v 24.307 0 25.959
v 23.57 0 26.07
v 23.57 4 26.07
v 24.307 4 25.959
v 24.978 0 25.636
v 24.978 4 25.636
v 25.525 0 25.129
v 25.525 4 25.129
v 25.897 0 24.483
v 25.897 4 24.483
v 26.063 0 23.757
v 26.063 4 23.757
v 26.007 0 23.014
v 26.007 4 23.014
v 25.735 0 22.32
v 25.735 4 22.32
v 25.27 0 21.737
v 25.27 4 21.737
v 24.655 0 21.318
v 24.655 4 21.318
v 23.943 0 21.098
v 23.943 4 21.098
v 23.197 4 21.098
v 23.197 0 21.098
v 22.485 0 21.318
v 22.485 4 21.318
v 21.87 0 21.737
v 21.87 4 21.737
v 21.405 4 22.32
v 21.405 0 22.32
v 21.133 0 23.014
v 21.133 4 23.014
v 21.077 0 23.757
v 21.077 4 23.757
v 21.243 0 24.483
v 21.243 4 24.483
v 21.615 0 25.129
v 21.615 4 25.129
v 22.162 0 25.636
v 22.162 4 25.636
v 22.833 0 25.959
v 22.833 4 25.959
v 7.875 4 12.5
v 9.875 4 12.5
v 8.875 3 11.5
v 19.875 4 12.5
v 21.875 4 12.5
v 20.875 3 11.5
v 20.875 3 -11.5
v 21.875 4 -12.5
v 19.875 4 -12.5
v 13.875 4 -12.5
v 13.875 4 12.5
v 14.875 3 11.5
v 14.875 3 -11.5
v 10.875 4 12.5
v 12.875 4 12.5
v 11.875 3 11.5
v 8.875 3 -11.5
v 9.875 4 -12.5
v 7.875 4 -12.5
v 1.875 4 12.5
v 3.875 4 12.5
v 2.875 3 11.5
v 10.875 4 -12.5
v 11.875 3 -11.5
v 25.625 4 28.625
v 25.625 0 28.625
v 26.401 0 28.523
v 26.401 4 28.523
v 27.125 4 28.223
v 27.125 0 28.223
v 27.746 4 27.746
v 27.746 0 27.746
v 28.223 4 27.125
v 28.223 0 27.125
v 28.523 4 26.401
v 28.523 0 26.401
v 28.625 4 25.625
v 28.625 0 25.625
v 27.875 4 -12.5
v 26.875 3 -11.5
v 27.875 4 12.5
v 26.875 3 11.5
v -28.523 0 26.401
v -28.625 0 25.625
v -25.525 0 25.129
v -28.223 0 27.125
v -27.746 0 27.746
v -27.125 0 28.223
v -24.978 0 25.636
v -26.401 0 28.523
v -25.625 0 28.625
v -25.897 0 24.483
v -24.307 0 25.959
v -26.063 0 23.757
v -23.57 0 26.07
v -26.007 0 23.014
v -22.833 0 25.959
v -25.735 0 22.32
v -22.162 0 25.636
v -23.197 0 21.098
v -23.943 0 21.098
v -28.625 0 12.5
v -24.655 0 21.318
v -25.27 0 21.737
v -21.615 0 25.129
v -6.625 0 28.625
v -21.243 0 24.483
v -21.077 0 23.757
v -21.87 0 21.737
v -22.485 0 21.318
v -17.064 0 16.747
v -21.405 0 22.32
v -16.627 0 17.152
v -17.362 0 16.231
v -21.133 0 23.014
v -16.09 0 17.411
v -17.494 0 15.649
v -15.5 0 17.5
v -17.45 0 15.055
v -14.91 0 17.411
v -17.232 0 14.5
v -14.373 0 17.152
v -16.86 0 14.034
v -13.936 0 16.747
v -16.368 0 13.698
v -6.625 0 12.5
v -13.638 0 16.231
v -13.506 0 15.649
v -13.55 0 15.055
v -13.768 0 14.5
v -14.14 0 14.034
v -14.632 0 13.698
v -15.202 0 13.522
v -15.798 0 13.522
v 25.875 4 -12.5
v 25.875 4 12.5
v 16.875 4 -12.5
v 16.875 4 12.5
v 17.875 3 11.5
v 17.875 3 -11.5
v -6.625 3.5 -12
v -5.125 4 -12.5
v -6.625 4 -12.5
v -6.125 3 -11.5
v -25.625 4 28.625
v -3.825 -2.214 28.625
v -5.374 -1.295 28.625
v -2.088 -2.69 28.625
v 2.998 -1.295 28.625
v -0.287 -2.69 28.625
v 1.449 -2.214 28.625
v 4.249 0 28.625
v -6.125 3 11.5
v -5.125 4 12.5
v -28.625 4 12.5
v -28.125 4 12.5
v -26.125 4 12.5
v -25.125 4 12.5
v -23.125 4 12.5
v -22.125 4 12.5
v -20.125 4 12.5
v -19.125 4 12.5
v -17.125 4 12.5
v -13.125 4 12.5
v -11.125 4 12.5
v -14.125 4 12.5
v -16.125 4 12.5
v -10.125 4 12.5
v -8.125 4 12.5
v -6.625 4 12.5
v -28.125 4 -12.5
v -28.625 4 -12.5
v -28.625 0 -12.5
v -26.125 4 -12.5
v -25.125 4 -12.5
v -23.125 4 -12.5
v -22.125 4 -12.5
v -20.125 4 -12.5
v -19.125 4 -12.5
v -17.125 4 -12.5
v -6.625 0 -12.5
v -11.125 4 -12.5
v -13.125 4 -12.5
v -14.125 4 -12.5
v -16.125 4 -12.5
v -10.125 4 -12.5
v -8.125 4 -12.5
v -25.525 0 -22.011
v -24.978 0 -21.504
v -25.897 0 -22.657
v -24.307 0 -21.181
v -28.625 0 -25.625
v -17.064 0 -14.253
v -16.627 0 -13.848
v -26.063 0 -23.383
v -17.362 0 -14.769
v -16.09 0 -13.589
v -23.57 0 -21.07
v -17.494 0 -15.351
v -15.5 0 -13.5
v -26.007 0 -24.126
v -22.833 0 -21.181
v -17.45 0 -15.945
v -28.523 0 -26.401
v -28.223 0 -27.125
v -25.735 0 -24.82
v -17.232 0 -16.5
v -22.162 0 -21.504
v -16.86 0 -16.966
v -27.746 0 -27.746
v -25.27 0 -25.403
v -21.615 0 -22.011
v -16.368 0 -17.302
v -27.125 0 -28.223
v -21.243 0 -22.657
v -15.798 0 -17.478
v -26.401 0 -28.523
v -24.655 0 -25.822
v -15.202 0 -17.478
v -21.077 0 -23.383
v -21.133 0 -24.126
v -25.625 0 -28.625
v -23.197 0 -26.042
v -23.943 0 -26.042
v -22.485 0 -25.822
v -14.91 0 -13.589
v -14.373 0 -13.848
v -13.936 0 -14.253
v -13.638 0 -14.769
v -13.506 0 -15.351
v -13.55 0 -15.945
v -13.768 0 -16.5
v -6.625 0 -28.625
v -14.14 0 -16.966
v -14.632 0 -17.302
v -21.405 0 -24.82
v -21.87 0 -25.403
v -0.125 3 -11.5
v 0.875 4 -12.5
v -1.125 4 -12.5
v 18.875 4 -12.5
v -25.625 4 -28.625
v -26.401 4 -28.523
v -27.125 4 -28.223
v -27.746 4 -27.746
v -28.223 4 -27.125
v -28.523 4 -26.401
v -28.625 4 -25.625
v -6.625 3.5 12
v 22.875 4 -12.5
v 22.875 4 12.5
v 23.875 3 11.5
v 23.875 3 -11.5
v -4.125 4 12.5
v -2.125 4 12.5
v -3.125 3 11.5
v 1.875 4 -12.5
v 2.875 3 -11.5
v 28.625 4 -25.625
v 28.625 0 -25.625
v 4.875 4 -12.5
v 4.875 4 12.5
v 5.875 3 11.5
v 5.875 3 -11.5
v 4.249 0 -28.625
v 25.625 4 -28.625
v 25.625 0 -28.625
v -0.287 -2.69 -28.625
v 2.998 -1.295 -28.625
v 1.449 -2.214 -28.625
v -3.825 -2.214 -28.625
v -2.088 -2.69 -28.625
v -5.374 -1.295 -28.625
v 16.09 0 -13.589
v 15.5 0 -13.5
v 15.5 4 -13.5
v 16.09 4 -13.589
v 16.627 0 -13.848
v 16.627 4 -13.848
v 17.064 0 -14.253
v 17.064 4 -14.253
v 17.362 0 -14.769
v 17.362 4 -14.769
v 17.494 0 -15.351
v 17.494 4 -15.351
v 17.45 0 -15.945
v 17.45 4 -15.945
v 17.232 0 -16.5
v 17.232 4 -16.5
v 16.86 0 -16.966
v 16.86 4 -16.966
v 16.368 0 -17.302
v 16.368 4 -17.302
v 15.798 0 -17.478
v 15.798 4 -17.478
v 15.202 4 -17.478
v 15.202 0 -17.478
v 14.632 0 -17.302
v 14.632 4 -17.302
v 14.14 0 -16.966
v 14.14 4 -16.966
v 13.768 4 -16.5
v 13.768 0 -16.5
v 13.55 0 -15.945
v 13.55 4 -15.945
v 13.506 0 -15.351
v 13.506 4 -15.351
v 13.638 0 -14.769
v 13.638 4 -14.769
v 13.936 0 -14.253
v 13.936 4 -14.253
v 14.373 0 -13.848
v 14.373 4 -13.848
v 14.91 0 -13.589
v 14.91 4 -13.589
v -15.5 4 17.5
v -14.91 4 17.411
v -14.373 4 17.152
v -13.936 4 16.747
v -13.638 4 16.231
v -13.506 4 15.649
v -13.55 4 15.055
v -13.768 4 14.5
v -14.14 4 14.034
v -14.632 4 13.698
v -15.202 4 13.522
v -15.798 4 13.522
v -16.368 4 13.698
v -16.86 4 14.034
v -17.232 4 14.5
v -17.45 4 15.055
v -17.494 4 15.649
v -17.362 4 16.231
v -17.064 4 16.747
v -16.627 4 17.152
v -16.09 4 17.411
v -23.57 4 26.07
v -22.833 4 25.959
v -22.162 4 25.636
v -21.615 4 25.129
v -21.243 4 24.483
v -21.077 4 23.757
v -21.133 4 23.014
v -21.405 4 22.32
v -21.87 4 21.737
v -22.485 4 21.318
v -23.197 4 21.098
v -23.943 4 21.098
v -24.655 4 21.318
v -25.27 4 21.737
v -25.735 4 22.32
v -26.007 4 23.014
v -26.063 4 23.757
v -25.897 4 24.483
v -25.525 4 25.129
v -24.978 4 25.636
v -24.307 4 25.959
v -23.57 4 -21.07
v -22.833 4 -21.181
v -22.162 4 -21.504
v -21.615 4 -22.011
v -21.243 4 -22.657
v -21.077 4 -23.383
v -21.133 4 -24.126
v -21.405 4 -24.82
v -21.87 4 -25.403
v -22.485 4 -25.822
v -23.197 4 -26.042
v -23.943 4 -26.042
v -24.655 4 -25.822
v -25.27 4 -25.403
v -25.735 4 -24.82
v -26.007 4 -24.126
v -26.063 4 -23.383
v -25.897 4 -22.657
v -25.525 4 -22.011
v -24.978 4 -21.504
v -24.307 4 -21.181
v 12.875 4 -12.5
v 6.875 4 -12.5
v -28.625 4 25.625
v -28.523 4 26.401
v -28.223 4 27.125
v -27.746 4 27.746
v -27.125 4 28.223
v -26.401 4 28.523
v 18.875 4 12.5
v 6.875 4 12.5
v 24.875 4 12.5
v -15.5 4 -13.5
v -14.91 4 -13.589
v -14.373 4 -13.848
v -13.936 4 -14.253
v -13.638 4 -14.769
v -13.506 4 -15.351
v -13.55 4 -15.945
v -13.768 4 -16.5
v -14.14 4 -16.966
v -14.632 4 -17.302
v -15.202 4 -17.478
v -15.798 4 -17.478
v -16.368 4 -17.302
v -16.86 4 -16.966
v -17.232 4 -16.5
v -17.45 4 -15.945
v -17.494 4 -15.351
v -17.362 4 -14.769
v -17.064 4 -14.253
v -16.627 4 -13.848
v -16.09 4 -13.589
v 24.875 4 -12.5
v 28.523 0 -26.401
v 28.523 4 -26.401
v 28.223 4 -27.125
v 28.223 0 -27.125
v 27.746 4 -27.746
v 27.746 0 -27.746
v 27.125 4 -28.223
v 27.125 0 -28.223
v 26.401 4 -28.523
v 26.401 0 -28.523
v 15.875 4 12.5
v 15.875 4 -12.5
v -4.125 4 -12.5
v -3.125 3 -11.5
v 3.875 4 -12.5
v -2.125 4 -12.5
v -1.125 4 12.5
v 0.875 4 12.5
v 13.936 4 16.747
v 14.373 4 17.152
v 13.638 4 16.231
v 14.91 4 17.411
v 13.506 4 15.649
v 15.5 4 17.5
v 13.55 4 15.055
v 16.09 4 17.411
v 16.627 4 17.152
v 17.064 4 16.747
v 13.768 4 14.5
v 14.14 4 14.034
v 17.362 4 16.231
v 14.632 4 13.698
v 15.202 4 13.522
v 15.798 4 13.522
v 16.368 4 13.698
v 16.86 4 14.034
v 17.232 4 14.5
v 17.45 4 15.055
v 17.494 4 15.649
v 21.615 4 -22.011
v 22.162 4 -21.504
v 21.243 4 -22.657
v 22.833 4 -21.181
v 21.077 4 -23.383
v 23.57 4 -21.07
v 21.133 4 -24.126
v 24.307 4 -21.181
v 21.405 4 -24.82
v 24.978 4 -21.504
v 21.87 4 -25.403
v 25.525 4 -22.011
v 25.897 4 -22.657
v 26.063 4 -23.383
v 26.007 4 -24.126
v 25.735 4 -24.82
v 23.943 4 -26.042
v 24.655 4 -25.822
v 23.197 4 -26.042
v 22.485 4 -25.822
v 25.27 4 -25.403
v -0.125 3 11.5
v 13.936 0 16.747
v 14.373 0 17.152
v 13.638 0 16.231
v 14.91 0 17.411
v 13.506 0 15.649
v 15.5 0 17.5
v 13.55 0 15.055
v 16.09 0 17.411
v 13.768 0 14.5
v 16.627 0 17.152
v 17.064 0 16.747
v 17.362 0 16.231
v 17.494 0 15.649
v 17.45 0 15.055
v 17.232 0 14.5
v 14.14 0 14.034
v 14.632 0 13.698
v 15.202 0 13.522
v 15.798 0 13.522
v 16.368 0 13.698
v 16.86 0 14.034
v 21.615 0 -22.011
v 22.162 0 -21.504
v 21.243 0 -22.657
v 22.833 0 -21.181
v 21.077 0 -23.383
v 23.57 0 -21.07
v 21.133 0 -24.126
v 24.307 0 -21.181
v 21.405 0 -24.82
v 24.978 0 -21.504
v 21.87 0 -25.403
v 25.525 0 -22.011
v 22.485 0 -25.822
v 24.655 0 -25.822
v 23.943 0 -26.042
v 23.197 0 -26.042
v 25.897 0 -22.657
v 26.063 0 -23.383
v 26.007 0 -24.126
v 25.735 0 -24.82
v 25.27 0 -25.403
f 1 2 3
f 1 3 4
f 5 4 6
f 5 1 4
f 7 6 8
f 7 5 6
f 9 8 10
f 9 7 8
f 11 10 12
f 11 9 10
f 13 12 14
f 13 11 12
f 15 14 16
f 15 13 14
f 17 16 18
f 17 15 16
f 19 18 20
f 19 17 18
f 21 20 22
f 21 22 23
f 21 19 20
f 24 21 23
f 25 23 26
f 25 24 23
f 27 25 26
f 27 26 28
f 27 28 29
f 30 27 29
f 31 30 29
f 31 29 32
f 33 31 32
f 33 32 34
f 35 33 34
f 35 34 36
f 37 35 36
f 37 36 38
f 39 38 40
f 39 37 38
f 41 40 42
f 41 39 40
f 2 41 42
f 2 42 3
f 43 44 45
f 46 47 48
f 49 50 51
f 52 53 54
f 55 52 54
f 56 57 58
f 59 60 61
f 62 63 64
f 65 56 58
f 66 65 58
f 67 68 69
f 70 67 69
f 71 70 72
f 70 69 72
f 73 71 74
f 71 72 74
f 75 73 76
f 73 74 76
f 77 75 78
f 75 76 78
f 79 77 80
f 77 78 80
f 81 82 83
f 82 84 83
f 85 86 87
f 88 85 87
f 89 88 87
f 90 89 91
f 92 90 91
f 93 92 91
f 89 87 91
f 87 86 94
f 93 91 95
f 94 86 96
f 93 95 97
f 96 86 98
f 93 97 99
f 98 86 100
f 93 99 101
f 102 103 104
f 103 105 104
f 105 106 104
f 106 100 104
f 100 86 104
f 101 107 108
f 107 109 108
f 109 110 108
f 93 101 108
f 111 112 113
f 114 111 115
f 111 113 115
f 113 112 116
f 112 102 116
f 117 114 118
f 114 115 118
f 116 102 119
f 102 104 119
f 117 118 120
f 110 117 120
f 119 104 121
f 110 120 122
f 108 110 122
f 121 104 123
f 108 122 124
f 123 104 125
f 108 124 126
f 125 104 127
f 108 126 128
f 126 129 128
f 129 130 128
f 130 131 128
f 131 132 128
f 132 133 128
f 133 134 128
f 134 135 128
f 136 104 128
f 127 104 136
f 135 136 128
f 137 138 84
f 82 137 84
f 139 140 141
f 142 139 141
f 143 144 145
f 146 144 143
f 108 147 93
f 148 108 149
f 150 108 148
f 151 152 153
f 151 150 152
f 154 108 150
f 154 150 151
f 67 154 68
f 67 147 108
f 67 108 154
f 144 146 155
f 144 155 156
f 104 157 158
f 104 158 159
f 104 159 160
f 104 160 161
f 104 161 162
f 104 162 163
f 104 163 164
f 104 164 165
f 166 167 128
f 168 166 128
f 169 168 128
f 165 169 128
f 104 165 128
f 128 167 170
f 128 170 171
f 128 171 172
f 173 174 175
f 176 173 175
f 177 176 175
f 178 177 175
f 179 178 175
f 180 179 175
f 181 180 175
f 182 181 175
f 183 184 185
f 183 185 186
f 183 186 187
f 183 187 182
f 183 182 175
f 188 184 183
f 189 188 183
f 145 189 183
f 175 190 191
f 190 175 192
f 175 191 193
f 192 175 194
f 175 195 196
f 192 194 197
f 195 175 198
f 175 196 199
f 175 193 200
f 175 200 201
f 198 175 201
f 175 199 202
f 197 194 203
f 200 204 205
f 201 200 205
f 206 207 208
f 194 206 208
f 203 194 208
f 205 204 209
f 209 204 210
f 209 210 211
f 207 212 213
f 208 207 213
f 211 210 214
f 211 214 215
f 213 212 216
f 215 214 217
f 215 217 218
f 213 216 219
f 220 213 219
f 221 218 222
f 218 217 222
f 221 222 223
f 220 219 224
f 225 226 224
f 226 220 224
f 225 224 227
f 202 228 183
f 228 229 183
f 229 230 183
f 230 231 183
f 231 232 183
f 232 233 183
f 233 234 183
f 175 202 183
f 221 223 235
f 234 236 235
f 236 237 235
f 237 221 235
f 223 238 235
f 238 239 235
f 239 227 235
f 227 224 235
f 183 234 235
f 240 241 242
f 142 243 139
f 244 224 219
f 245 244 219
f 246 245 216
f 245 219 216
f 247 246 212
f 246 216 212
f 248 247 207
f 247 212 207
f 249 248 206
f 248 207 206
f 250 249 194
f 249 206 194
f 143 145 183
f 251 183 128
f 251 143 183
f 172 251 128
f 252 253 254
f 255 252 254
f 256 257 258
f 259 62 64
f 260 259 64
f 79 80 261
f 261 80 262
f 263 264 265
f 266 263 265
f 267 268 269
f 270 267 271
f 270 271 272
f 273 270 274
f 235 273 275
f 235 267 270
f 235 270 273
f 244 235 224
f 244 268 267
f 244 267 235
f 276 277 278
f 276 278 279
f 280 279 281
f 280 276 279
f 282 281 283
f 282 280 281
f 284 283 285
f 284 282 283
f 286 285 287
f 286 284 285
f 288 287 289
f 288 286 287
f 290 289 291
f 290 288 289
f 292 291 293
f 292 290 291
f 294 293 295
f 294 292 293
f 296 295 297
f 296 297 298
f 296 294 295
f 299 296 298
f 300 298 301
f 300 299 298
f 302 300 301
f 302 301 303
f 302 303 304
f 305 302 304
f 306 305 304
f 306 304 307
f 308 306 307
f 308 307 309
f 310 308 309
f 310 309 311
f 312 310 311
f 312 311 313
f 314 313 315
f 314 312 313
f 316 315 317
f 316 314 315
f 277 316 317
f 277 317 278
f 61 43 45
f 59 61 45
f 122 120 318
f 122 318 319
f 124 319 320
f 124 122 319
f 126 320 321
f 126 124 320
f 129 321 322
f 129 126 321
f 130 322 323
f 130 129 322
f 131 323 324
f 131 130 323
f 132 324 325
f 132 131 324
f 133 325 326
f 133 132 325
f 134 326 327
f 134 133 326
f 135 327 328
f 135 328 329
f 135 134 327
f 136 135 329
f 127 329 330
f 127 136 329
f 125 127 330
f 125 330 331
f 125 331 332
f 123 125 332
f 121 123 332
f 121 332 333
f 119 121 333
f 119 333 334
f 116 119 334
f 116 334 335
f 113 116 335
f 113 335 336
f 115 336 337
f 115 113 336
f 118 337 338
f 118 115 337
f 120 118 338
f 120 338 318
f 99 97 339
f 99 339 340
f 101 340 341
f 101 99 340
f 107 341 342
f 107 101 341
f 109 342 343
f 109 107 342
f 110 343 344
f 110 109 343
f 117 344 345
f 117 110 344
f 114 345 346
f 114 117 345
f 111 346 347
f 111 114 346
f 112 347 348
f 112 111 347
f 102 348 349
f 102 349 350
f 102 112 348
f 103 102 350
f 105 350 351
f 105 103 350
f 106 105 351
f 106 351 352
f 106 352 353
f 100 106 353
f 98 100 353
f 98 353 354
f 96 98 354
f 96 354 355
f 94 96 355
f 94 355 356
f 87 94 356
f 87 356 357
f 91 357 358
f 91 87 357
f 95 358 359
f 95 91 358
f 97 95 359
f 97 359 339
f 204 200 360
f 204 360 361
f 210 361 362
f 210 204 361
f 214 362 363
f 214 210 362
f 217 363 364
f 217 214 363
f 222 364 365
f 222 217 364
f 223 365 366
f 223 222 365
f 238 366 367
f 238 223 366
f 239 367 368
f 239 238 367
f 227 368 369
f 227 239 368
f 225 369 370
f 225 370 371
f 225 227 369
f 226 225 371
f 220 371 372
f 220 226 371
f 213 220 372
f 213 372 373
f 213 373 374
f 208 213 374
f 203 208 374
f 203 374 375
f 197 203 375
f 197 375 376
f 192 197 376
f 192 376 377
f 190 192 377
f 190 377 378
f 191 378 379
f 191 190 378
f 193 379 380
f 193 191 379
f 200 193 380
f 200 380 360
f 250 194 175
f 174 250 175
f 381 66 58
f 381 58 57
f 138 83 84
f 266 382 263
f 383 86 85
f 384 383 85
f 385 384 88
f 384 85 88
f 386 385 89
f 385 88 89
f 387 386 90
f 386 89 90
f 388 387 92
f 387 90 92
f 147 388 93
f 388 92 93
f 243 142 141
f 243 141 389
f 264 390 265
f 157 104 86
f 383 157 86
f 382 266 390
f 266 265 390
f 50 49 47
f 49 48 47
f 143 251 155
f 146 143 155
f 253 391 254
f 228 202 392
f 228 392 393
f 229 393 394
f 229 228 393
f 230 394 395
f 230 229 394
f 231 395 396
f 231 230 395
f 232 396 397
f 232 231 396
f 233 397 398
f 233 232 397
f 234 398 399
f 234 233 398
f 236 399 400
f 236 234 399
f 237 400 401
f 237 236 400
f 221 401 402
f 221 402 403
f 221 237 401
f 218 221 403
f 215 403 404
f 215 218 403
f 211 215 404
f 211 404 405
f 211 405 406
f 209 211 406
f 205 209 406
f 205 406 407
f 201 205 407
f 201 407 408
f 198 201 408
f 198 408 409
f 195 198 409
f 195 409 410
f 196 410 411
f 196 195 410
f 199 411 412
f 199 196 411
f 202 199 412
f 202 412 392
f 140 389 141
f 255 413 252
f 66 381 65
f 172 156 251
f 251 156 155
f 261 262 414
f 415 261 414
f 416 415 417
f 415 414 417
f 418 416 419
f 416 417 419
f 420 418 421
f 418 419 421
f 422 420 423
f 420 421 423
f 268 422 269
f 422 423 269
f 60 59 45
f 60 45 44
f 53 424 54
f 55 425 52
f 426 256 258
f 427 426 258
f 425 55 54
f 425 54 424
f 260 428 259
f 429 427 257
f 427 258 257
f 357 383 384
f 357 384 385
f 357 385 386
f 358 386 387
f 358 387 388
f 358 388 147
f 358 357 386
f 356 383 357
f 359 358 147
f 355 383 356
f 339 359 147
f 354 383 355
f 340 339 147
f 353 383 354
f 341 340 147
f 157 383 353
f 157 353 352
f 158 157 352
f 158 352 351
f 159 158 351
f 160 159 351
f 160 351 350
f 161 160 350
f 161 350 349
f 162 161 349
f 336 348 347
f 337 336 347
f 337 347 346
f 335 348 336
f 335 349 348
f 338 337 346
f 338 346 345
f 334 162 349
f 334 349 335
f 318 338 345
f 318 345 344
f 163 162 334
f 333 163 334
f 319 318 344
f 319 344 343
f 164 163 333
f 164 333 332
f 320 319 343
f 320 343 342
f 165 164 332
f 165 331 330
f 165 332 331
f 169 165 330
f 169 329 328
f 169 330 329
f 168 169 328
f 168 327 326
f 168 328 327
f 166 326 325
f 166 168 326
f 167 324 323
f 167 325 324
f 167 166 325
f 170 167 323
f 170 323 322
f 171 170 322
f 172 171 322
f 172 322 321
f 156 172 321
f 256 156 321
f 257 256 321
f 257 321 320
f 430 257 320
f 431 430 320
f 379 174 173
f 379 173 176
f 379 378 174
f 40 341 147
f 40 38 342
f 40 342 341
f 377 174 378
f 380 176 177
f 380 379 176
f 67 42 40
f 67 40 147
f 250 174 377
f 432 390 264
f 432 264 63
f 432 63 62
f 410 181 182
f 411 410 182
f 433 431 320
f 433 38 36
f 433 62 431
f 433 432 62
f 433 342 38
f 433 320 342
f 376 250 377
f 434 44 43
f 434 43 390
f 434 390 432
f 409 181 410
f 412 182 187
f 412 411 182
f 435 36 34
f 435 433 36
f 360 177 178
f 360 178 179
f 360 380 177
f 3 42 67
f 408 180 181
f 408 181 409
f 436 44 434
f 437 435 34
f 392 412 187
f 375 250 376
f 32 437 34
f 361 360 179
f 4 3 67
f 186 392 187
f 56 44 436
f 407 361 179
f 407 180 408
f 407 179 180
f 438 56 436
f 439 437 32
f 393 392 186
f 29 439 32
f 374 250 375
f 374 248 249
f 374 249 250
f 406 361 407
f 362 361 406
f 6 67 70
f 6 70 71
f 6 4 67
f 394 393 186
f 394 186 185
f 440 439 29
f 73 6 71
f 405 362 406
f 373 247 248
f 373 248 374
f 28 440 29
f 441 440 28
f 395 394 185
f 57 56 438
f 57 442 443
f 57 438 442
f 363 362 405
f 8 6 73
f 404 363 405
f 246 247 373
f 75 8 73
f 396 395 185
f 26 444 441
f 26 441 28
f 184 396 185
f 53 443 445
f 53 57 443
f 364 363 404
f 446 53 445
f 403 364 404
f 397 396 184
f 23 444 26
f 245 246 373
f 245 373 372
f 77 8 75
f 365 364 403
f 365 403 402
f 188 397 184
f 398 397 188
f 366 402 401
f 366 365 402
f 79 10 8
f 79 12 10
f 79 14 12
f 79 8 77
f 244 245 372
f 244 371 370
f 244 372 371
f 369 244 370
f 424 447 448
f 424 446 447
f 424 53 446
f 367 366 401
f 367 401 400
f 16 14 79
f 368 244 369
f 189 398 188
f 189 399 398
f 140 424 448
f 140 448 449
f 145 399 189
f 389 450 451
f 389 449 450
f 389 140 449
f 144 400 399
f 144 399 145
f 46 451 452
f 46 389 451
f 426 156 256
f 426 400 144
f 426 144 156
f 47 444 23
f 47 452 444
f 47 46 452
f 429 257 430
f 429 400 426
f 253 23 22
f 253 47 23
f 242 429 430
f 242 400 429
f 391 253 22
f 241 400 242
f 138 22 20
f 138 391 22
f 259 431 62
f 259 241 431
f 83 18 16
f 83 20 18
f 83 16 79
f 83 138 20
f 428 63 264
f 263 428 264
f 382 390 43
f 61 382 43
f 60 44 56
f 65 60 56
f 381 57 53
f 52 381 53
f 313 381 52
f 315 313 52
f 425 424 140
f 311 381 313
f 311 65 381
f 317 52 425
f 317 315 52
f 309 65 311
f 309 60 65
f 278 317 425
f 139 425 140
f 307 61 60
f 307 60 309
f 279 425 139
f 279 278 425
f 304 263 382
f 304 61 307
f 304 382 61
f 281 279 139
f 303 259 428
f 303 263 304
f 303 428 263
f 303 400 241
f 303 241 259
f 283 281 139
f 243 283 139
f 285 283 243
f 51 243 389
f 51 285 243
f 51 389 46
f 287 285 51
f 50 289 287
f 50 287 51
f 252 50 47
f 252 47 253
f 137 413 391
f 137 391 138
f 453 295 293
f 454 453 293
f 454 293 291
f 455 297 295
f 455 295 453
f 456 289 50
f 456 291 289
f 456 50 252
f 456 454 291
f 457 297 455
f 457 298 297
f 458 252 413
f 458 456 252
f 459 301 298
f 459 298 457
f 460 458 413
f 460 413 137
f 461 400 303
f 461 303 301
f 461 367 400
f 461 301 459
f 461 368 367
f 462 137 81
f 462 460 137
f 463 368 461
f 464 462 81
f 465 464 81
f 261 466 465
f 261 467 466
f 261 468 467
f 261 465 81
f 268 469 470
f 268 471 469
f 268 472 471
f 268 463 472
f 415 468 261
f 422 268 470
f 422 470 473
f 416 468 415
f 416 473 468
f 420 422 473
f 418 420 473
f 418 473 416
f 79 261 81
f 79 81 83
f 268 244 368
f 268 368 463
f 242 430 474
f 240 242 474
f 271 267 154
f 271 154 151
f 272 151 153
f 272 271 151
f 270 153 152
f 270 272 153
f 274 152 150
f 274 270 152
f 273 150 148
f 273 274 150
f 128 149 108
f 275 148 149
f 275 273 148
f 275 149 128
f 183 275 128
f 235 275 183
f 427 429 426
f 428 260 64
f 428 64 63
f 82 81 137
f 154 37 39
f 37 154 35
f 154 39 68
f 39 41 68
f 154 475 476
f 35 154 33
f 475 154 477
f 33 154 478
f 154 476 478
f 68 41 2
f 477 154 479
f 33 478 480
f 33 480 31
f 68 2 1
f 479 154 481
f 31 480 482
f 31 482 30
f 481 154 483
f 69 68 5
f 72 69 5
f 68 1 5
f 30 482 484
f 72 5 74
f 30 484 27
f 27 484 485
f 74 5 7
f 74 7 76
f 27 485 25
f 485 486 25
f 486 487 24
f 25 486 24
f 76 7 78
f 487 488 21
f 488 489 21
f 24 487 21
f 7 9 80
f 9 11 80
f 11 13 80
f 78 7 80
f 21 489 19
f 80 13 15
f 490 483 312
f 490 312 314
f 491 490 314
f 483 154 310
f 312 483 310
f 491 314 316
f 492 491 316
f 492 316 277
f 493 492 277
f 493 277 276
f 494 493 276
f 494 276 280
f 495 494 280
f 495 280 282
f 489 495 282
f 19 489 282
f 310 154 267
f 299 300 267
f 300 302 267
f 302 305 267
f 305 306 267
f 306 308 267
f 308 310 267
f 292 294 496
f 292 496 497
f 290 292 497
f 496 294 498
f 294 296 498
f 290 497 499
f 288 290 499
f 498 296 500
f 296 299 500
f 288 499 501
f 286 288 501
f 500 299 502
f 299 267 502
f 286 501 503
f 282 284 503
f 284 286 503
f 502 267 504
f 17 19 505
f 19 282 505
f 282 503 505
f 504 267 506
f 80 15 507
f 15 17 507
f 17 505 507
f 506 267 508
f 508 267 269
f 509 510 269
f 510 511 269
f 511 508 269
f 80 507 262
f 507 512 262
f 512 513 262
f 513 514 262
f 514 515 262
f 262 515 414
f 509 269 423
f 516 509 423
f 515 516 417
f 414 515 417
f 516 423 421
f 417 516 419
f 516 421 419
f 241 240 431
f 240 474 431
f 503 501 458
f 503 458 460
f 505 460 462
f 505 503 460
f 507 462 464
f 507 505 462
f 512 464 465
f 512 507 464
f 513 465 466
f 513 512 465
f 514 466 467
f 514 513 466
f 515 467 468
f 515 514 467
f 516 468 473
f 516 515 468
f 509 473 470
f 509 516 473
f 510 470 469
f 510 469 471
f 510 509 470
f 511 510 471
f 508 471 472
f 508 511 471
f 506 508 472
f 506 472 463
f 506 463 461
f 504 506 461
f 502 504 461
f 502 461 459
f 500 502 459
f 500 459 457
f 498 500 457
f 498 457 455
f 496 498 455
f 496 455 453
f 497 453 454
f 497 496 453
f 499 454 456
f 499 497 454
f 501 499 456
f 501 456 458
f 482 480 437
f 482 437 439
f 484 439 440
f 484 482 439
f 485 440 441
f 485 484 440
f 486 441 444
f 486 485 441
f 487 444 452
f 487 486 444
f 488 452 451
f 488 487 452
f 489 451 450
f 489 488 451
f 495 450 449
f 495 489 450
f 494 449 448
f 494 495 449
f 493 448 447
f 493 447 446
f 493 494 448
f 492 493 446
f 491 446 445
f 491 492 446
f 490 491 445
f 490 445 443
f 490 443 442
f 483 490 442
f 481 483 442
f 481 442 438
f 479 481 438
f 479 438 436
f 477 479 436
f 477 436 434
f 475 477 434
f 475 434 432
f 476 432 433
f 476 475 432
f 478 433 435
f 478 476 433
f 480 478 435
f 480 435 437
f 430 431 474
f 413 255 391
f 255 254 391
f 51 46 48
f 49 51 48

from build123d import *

# Parameters (mm, degrees)
SKETCH1_R              = 2
SKETCH1_R_2            = 2.5
BOSS_EXTRUDE1_DEPTH    = 4
CUT_EXTRUDE2_DEPTH     = 23
CHAMFER2_SIZE          = 1
CUT_EXTRUDE3_START     = -4
CUT_EXTRUDE3_OUTLINE_W = 22
CUT_EXTRUDE3_OUTLINE_H = 25
CUT_EXTRUDE3_DEPTH     = 4
BOSS_EXTRUDE2_REACH    = 66.132


# Read off the part's stored shape, not the designer's step: Cut-Extrude3
with BuildPart() as part:
    # Sketch1 → Boss-Extrude1 (new body)
    with BuildSketch(Plane(origin=(0, 0, 0), x_dir=(1, 0, 0), z_dir=(0, 1, 0))):
        with BuildLine():
            Line((25.625, 28.625), (-25.625, 28.625))
            ThreePointArc((-25.625, 28.625), (-27.746320344, 27.746320344), (-28.625, 25.625))
            Line((-28.625, 25.625), (-28.625, -25.625))
            ThreePointArc((-28.625, -25.625), (-27.746320344, -27.746320344), (-25.625, -28.625))
            Line((-25.625, -28.625), (25.625, -28.625))
            ThreePointArc((25.625, -28.625), (27.746320344, -27.746320344), (28.625, -25.625))
            Line((28.625, -25.625), (28.625, 25.625))
            ThreePointArc((28.625, 25.625), (27.746320344, 27.746320344), (25.625, 28.625))
        make_face()
        with Locations(Location((-15.5, 15.5, 0), (0, 0, 270))):
            Circle(SKETCH1_R, mode=Mode.SUBTRACT)
        with Locations(Location((-23.57, 23.57, 0), (0, 0, 270))):
            Circle(SKETCH1_R_2, mode=Mode.SUBTRACT)
        with Locations(Location((23.57, 23.57, 0), (0, 0, 270))):
            Circle(SKETCH1_R_2, mode=Mode.SUBTRACT)
        with Locations(Location((15.5, 15.5, 0), (0, 0, 270))):
            Circle(SKETCH1_R, mode=Mode.SUBTRACT)
        with Locations(Location((15.5, -15.5, 0), (0, 0, 270))):
            Circle(SKETCH1_R, mode=Mode.SUBTRACT)
        with Locations(Location((-15.5, -15.5, 0), (0, 0, 270))):
            Circle(SKETCH1_R, mode=Mode.SUBTRACT)
        with Locations(Location((-23.57, -23.57, 0), (0, 0, 270))):
            Circle(SKETCH1_R_2, mode=Mode.SUBTRACT)
        with Locations(Location((23.57, -23.57, 0), (0, 0, 270))):
            Circle(SKETCH1_R_2, mode=Mode.SUBTRACT)
    extrude(amount=BOSS_EXTRUDE1_DEPTH)

    # Sketch3 → Cut-Extrude2 (cut)
    with BuildSketch(Plane.XY.offset(11.5)):
        Polygon((-28.125, 4), (-27.125, 3), (-26.125, 4), align=None)
        Polygon((-25.125, 4), (-24.125, 3), (-23.125, 4), align=None)
        Polygon((-22.125, 4), (-21.125, 3), (-20.125, 4), align=None)
        Polygon((-19.125, 4), (-18.125, 3), (-17.125, 4), align=None)
        Polygon((-16.125, 4), (-15.125, 3), (-14.125, 4), align=None)
        Polygon((-13.125, 4), (-12.125, 3), (-11.125, 4), align=None)
        Polygon((-10.125, 4), (-9.125, 3), (-8.125, 4), align=None)
        Polygon((-7.125, 4), (-6.125, 3), (-5.125, 4), align=None)
        Polygon((-4.125, 4), (-3.125, 3), (-2.125, 4), align=None)
        Polygon((-1.125, 4), (-0.125, 3), (0.875, 4), align=None)
        Polygon((1.875, 4), (2.875, 3), (3.875, 4), align=None)
        Polygon((4.875, 4), (5.875, 3), (6.875, 4), align=None)
        Polygon((7.875, 4), (8.875, 3), (9.875, 4), align=None)
        Polygon((10.875, 4), (11.875, 3), (12.875, 4), align=None)
        Polygon((13.875, 4), (14.875, 3), (15.875, 4), align=None)
        Polygon((16.875, 4), (17.875, 3), (18.875, 4), align=None)
        Polygon((19.875, 4), (20.875, 3), (21.875, 4), align=None)
        Polygon((22.875, 4), (23.875, 3), (24.875, 4), align=None)
        Polygon((25.875, 4), (26.875, 3), (27.875, 4), align=None)
    extrude(amount=-CUT_EXTRUDE2_DEPTH, mode=Mode.SUBTRACT)

    # Chamfer2
    chamfer2_edges = [part.edges().sort_by_distance(p)[0] for p in [
        (26.875, 4, -11.5),
        (23.875, 4, -11.5),
        (20.875, 4, -11.5),
        (17.875, 4, -11.5),
        (14.875, 4, -11.5),
        (11.875, 4, -11.5),
        (8.875, 4, -11.5),
        (5.875, 4, -11.5),
        (2.875, 4, -11.5),
        (-0.125, 4, -11.5),
        (-3.125, 4, -11.5),
        (-6.125, 4, -11.5),
        (-9.125, 4, -11.5),
        (-12.125, 4, -11.5),
        (-15.125, 4, -11.5),
        (-18.125, 4, -11.5),
        (-21.125, 4, -11.5),
        (-24.125, 4, -11.5),
        (-27.125, 4, -11.5),
        (26.875, 4, 11.5),
        (23.875, 4, 11.5),
        (20.875, 4, 11.5),
        (17.875, 4, 11.5),
        (14.875, 4, 11.5),
        (11.875, 4, 11.5),
        (8.875, 4, 11.5),
        (5.875, 4, 11.5),
        (2.875, 4, 11.5),
        (-0.125, 4, 11.5),
        (-3.125, 4, 11.5),
        (-6.125, 4, 11.5),
        (-9.125, 4, 11.5),
        (-12.125, 4, 11.5),
        (-15.125, 4, 11.5),
        (-18.125, 4, 11.5),
        (-21.125, 4, 11.5),
        (-24.125, 4, 11.5),
        (-27.125, 4, 11.5),
    ]]
    chamfer(chamfer2_edges, length=CHAMFER2_SIZE - 0.0001)  # a hair under: the kernel refuses the full size

    # Cut-Extrude3 outline → Cut-Extrude3 (cut)
    with BuildSketch(Plane.XZ.offset(CUT_EXTRUDE3_START)):
        with Locations((-17.625, 0)):
            Rectangle(CUT_EXTRUDE3_OUTLINE_W, CUT_EXTRUDE3_OUTLINE_H)
    extrude(amount=CUT_EXTRUDE3_DEPTH, mode=Mode.SUBTRACT)

    # Boss-Extrude2: up to this face of the body (flat: up to its plane)
    boss_extrude2_end = Plane(part.part.faces().sort_by_distance((0, 2, 28.625))[0])
    # Sketch5 → Boss-Extrude2 (add, up to the picked face)
    with BuildSketch(Plane(origin=(0, 0, -28.625), x_dir=(-1, 0, 0), z_dir=(0, 0, -1)), mode=Mode.PRIVATE) as boss_extrude2_sk1:
        with BuildLine():
            Line((6.625, 0), (-4.249281585, 0))
            ThreePointArc((-4.249281585, 0), (1.187859207, -2.75), (6.625, 0))
        make_face()
    boss_extrude2_tool1 = split(extrude(boss_extrude2_sk1.sketch, amount=-BOSS_EXTRUDE2_REACH, mode=Mode.PRIVATE), bisect_by=boss_extrude2_end, keep=Keep.BOTH, mode=Mode.PRIVATE)
    add(boss_extrude2_tool1.solids().sort_by(Axis((-1.187859, -1.121798, -28.625), (0, 0, 1)))[0])


solid = part.part
